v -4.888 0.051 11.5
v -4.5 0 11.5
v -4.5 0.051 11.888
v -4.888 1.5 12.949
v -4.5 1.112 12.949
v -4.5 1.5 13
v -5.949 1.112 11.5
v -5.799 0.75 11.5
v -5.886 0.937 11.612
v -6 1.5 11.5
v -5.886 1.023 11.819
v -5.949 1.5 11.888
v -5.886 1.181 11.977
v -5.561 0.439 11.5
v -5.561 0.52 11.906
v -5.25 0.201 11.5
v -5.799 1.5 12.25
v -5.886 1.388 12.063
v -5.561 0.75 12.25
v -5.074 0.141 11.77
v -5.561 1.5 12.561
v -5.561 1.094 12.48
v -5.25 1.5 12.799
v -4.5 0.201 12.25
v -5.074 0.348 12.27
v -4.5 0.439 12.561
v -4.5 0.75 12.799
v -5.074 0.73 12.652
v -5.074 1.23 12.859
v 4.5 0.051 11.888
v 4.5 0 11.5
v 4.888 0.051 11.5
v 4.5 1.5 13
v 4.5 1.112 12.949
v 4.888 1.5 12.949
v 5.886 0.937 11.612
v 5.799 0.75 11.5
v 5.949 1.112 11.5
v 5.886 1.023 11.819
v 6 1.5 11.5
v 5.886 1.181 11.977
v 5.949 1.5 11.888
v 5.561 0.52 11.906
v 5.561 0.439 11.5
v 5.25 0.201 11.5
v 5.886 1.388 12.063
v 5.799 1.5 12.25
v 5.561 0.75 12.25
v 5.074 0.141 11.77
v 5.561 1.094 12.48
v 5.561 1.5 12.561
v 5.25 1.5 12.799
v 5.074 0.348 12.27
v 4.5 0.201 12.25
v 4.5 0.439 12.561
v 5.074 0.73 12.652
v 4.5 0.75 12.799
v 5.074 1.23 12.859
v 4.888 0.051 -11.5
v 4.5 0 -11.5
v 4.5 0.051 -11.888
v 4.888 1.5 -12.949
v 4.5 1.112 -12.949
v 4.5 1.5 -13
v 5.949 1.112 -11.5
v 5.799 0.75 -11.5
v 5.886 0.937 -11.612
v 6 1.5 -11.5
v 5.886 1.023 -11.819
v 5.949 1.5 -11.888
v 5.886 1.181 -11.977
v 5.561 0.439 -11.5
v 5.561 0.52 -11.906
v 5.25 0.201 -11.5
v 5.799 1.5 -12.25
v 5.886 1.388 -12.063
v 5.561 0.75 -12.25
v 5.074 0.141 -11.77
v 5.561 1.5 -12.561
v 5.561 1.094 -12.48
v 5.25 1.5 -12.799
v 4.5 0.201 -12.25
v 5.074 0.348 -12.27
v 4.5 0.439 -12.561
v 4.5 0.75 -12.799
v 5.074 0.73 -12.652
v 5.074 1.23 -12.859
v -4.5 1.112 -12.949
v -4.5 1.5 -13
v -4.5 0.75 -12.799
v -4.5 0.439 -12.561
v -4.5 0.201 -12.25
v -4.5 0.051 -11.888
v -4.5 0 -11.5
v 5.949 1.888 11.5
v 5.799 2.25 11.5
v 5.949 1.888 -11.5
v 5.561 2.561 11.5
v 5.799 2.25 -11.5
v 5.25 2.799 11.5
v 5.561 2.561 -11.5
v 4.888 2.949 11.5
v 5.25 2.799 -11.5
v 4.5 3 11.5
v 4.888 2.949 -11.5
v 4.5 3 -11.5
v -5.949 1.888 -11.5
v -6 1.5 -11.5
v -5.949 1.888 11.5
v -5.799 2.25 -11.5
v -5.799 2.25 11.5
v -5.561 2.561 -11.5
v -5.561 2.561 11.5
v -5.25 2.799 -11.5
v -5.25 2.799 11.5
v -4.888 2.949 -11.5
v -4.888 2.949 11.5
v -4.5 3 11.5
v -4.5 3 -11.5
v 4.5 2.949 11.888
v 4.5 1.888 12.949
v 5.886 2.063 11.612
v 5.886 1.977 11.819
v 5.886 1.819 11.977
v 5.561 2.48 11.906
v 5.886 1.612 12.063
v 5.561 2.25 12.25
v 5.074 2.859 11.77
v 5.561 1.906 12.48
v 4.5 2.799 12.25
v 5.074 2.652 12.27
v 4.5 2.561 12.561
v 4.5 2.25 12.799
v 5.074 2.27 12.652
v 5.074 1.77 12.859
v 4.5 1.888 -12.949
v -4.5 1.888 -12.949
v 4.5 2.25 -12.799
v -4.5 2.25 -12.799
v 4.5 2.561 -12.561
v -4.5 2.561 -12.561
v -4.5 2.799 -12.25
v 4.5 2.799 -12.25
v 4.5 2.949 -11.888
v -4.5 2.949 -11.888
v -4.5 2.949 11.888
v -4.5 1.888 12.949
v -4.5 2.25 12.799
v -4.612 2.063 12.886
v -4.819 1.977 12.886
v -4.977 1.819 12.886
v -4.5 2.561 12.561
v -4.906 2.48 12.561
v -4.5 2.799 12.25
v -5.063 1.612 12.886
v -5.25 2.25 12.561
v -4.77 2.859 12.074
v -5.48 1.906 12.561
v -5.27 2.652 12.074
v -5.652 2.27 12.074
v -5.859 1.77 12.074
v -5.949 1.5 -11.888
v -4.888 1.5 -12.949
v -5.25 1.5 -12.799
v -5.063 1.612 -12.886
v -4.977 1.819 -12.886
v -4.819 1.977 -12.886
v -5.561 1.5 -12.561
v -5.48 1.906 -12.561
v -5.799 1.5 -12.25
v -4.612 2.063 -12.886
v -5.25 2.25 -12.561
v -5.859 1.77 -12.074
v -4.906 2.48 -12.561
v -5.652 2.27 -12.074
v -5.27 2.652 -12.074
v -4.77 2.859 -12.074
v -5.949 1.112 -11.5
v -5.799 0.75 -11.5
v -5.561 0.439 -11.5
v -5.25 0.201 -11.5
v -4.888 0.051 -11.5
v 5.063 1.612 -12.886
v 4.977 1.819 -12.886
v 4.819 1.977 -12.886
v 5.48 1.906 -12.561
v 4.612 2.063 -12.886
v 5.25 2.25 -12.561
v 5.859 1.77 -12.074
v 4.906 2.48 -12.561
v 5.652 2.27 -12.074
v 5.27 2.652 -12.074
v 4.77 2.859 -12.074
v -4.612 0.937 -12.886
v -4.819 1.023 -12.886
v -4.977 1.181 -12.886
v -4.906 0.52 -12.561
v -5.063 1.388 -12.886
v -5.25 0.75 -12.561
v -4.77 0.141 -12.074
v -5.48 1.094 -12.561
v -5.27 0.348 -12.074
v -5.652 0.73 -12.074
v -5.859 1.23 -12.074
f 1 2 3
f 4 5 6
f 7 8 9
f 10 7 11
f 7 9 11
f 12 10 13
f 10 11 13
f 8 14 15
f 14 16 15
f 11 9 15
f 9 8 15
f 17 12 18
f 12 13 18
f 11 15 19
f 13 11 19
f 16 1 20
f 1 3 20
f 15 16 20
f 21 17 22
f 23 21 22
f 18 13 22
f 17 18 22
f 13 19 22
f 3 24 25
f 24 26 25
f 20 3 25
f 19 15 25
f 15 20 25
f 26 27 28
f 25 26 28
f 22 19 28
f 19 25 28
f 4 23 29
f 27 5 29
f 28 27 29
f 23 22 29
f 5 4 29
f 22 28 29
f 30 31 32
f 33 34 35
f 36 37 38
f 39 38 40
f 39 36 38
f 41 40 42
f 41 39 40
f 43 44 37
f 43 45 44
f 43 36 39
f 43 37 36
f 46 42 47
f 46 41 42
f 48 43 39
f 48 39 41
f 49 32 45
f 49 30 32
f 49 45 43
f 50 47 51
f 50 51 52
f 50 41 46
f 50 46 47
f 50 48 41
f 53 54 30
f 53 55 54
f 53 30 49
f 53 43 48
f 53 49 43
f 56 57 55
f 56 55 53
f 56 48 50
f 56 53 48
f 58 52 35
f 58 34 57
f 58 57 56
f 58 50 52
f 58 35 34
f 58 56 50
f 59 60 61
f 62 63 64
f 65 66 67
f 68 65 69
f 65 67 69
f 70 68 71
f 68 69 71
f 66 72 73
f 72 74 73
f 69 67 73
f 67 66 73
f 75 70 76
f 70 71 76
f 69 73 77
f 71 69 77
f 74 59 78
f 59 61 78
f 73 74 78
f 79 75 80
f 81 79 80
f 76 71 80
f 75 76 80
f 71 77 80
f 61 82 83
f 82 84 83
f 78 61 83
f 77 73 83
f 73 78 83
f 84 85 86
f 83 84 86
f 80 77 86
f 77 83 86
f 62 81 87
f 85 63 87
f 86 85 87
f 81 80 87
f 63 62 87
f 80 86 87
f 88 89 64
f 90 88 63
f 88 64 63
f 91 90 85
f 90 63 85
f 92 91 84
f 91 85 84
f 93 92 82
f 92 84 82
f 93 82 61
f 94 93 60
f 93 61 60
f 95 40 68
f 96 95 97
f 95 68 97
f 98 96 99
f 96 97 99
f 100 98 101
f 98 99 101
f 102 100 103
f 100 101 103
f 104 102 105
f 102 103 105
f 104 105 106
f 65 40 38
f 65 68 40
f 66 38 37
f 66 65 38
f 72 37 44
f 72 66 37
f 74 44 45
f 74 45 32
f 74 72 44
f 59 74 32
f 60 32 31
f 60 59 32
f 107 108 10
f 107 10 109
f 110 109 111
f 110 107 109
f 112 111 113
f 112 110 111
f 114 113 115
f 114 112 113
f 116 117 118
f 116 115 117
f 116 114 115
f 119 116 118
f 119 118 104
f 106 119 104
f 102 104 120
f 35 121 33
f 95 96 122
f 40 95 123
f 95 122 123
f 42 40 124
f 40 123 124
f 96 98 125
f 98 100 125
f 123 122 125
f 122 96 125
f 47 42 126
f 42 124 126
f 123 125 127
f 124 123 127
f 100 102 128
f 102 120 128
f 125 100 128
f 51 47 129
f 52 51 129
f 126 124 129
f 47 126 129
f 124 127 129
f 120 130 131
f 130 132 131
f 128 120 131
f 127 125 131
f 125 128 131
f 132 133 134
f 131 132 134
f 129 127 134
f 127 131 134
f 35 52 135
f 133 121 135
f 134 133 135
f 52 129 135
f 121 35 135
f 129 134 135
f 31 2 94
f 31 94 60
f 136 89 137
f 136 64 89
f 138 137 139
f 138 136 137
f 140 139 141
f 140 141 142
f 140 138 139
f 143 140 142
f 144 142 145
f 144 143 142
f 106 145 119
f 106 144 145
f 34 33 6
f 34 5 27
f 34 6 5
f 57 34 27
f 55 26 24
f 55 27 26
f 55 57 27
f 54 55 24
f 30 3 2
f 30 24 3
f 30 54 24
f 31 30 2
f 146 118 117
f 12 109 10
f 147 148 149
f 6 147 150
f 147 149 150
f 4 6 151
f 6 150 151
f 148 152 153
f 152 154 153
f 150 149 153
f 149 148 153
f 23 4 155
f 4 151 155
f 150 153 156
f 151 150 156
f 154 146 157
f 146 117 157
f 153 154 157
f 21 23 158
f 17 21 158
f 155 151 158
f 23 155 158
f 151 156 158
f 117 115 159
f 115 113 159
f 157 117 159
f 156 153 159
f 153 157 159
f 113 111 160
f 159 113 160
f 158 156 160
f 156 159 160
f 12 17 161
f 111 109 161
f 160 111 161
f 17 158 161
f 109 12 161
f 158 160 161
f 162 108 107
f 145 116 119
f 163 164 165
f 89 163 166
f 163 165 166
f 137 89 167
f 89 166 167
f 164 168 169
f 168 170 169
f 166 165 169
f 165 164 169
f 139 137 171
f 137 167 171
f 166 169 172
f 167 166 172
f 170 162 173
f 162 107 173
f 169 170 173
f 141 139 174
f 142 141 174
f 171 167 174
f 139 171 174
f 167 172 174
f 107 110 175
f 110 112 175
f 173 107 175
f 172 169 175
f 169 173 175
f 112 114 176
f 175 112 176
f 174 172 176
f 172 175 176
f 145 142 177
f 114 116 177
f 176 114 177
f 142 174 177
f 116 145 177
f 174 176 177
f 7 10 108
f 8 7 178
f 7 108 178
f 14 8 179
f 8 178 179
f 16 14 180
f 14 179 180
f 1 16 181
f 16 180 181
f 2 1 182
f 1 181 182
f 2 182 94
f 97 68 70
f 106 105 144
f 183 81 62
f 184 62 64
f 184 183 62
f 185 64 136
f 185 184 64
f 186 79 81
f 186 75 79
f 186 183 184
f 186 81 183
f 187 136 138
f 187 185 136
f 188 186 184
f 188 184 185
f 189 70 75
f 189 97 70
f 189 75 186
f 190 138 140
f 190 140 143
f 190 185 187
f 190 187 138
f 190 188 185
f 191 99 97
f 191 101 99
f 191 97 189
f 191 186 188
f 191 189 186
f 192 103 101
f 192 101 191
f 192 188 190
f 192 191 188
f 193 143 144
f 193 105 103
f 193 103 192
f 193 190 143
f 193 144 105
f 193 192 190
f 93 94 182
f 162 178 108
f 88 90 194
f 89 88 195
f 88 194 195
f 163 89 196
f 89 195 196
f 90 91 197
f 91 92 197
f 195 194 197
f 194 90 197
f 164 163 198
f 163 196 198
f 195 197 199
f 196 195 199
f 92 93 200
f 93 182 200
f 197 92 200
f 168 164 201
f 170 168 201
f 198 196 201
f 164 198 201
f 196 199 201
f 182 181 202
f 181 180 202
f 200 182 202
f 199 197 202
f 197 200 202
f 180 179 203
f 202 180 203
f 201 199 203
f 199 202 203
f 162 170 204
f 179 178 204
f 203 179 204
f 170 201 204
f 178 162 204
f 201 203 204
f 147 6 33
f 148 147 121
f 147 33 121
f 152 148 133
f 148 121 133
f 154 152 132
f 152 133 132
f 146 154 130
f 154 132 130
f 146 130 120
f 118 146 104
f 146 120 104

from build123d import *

# Parameters (mm, degrees)
SKETCH1_W           = 12
SKETCH1_H           = 26
BOSS_EXTRUDE1_DEPTH = 3
FILLET1_R           = 1.5


with BuildPart() as part:
    # Sketch1 → Boss-Extrude1 (new body)
    with BuildSketch(Plane(origin=(0, 0, 0), x_dir=(1, 0, 0), z_dir=(0, 1, 0))):
        Rectangle(SKETCH1_W, SKETCH1_H)
    extrude(amount=BOSS_EXTRUDE1_DEPTH)

    # Fillet1
    fillet1_edges = [part.edges().sort_by_distance(p)[0] for p in [
        (-6, 3, 0),
        (0, 3, 13),
        (6, 3, 0),
        (0, 0, 13),
        (-6, 0, 0),
        (0, 0, -13),
        (6, 0, 0),
        (6, 1.5, 13),
        (-6, 1.5, 13),
        (-6, 1.5, -13),
        (6, 1.5, -13),
        (0, 3, -13),
    ]]
    fillet(fillet1_edges, radius=FILLET1_R - 0.0001)  # a hair under: the kernel refuses the full size


solid = part.part
